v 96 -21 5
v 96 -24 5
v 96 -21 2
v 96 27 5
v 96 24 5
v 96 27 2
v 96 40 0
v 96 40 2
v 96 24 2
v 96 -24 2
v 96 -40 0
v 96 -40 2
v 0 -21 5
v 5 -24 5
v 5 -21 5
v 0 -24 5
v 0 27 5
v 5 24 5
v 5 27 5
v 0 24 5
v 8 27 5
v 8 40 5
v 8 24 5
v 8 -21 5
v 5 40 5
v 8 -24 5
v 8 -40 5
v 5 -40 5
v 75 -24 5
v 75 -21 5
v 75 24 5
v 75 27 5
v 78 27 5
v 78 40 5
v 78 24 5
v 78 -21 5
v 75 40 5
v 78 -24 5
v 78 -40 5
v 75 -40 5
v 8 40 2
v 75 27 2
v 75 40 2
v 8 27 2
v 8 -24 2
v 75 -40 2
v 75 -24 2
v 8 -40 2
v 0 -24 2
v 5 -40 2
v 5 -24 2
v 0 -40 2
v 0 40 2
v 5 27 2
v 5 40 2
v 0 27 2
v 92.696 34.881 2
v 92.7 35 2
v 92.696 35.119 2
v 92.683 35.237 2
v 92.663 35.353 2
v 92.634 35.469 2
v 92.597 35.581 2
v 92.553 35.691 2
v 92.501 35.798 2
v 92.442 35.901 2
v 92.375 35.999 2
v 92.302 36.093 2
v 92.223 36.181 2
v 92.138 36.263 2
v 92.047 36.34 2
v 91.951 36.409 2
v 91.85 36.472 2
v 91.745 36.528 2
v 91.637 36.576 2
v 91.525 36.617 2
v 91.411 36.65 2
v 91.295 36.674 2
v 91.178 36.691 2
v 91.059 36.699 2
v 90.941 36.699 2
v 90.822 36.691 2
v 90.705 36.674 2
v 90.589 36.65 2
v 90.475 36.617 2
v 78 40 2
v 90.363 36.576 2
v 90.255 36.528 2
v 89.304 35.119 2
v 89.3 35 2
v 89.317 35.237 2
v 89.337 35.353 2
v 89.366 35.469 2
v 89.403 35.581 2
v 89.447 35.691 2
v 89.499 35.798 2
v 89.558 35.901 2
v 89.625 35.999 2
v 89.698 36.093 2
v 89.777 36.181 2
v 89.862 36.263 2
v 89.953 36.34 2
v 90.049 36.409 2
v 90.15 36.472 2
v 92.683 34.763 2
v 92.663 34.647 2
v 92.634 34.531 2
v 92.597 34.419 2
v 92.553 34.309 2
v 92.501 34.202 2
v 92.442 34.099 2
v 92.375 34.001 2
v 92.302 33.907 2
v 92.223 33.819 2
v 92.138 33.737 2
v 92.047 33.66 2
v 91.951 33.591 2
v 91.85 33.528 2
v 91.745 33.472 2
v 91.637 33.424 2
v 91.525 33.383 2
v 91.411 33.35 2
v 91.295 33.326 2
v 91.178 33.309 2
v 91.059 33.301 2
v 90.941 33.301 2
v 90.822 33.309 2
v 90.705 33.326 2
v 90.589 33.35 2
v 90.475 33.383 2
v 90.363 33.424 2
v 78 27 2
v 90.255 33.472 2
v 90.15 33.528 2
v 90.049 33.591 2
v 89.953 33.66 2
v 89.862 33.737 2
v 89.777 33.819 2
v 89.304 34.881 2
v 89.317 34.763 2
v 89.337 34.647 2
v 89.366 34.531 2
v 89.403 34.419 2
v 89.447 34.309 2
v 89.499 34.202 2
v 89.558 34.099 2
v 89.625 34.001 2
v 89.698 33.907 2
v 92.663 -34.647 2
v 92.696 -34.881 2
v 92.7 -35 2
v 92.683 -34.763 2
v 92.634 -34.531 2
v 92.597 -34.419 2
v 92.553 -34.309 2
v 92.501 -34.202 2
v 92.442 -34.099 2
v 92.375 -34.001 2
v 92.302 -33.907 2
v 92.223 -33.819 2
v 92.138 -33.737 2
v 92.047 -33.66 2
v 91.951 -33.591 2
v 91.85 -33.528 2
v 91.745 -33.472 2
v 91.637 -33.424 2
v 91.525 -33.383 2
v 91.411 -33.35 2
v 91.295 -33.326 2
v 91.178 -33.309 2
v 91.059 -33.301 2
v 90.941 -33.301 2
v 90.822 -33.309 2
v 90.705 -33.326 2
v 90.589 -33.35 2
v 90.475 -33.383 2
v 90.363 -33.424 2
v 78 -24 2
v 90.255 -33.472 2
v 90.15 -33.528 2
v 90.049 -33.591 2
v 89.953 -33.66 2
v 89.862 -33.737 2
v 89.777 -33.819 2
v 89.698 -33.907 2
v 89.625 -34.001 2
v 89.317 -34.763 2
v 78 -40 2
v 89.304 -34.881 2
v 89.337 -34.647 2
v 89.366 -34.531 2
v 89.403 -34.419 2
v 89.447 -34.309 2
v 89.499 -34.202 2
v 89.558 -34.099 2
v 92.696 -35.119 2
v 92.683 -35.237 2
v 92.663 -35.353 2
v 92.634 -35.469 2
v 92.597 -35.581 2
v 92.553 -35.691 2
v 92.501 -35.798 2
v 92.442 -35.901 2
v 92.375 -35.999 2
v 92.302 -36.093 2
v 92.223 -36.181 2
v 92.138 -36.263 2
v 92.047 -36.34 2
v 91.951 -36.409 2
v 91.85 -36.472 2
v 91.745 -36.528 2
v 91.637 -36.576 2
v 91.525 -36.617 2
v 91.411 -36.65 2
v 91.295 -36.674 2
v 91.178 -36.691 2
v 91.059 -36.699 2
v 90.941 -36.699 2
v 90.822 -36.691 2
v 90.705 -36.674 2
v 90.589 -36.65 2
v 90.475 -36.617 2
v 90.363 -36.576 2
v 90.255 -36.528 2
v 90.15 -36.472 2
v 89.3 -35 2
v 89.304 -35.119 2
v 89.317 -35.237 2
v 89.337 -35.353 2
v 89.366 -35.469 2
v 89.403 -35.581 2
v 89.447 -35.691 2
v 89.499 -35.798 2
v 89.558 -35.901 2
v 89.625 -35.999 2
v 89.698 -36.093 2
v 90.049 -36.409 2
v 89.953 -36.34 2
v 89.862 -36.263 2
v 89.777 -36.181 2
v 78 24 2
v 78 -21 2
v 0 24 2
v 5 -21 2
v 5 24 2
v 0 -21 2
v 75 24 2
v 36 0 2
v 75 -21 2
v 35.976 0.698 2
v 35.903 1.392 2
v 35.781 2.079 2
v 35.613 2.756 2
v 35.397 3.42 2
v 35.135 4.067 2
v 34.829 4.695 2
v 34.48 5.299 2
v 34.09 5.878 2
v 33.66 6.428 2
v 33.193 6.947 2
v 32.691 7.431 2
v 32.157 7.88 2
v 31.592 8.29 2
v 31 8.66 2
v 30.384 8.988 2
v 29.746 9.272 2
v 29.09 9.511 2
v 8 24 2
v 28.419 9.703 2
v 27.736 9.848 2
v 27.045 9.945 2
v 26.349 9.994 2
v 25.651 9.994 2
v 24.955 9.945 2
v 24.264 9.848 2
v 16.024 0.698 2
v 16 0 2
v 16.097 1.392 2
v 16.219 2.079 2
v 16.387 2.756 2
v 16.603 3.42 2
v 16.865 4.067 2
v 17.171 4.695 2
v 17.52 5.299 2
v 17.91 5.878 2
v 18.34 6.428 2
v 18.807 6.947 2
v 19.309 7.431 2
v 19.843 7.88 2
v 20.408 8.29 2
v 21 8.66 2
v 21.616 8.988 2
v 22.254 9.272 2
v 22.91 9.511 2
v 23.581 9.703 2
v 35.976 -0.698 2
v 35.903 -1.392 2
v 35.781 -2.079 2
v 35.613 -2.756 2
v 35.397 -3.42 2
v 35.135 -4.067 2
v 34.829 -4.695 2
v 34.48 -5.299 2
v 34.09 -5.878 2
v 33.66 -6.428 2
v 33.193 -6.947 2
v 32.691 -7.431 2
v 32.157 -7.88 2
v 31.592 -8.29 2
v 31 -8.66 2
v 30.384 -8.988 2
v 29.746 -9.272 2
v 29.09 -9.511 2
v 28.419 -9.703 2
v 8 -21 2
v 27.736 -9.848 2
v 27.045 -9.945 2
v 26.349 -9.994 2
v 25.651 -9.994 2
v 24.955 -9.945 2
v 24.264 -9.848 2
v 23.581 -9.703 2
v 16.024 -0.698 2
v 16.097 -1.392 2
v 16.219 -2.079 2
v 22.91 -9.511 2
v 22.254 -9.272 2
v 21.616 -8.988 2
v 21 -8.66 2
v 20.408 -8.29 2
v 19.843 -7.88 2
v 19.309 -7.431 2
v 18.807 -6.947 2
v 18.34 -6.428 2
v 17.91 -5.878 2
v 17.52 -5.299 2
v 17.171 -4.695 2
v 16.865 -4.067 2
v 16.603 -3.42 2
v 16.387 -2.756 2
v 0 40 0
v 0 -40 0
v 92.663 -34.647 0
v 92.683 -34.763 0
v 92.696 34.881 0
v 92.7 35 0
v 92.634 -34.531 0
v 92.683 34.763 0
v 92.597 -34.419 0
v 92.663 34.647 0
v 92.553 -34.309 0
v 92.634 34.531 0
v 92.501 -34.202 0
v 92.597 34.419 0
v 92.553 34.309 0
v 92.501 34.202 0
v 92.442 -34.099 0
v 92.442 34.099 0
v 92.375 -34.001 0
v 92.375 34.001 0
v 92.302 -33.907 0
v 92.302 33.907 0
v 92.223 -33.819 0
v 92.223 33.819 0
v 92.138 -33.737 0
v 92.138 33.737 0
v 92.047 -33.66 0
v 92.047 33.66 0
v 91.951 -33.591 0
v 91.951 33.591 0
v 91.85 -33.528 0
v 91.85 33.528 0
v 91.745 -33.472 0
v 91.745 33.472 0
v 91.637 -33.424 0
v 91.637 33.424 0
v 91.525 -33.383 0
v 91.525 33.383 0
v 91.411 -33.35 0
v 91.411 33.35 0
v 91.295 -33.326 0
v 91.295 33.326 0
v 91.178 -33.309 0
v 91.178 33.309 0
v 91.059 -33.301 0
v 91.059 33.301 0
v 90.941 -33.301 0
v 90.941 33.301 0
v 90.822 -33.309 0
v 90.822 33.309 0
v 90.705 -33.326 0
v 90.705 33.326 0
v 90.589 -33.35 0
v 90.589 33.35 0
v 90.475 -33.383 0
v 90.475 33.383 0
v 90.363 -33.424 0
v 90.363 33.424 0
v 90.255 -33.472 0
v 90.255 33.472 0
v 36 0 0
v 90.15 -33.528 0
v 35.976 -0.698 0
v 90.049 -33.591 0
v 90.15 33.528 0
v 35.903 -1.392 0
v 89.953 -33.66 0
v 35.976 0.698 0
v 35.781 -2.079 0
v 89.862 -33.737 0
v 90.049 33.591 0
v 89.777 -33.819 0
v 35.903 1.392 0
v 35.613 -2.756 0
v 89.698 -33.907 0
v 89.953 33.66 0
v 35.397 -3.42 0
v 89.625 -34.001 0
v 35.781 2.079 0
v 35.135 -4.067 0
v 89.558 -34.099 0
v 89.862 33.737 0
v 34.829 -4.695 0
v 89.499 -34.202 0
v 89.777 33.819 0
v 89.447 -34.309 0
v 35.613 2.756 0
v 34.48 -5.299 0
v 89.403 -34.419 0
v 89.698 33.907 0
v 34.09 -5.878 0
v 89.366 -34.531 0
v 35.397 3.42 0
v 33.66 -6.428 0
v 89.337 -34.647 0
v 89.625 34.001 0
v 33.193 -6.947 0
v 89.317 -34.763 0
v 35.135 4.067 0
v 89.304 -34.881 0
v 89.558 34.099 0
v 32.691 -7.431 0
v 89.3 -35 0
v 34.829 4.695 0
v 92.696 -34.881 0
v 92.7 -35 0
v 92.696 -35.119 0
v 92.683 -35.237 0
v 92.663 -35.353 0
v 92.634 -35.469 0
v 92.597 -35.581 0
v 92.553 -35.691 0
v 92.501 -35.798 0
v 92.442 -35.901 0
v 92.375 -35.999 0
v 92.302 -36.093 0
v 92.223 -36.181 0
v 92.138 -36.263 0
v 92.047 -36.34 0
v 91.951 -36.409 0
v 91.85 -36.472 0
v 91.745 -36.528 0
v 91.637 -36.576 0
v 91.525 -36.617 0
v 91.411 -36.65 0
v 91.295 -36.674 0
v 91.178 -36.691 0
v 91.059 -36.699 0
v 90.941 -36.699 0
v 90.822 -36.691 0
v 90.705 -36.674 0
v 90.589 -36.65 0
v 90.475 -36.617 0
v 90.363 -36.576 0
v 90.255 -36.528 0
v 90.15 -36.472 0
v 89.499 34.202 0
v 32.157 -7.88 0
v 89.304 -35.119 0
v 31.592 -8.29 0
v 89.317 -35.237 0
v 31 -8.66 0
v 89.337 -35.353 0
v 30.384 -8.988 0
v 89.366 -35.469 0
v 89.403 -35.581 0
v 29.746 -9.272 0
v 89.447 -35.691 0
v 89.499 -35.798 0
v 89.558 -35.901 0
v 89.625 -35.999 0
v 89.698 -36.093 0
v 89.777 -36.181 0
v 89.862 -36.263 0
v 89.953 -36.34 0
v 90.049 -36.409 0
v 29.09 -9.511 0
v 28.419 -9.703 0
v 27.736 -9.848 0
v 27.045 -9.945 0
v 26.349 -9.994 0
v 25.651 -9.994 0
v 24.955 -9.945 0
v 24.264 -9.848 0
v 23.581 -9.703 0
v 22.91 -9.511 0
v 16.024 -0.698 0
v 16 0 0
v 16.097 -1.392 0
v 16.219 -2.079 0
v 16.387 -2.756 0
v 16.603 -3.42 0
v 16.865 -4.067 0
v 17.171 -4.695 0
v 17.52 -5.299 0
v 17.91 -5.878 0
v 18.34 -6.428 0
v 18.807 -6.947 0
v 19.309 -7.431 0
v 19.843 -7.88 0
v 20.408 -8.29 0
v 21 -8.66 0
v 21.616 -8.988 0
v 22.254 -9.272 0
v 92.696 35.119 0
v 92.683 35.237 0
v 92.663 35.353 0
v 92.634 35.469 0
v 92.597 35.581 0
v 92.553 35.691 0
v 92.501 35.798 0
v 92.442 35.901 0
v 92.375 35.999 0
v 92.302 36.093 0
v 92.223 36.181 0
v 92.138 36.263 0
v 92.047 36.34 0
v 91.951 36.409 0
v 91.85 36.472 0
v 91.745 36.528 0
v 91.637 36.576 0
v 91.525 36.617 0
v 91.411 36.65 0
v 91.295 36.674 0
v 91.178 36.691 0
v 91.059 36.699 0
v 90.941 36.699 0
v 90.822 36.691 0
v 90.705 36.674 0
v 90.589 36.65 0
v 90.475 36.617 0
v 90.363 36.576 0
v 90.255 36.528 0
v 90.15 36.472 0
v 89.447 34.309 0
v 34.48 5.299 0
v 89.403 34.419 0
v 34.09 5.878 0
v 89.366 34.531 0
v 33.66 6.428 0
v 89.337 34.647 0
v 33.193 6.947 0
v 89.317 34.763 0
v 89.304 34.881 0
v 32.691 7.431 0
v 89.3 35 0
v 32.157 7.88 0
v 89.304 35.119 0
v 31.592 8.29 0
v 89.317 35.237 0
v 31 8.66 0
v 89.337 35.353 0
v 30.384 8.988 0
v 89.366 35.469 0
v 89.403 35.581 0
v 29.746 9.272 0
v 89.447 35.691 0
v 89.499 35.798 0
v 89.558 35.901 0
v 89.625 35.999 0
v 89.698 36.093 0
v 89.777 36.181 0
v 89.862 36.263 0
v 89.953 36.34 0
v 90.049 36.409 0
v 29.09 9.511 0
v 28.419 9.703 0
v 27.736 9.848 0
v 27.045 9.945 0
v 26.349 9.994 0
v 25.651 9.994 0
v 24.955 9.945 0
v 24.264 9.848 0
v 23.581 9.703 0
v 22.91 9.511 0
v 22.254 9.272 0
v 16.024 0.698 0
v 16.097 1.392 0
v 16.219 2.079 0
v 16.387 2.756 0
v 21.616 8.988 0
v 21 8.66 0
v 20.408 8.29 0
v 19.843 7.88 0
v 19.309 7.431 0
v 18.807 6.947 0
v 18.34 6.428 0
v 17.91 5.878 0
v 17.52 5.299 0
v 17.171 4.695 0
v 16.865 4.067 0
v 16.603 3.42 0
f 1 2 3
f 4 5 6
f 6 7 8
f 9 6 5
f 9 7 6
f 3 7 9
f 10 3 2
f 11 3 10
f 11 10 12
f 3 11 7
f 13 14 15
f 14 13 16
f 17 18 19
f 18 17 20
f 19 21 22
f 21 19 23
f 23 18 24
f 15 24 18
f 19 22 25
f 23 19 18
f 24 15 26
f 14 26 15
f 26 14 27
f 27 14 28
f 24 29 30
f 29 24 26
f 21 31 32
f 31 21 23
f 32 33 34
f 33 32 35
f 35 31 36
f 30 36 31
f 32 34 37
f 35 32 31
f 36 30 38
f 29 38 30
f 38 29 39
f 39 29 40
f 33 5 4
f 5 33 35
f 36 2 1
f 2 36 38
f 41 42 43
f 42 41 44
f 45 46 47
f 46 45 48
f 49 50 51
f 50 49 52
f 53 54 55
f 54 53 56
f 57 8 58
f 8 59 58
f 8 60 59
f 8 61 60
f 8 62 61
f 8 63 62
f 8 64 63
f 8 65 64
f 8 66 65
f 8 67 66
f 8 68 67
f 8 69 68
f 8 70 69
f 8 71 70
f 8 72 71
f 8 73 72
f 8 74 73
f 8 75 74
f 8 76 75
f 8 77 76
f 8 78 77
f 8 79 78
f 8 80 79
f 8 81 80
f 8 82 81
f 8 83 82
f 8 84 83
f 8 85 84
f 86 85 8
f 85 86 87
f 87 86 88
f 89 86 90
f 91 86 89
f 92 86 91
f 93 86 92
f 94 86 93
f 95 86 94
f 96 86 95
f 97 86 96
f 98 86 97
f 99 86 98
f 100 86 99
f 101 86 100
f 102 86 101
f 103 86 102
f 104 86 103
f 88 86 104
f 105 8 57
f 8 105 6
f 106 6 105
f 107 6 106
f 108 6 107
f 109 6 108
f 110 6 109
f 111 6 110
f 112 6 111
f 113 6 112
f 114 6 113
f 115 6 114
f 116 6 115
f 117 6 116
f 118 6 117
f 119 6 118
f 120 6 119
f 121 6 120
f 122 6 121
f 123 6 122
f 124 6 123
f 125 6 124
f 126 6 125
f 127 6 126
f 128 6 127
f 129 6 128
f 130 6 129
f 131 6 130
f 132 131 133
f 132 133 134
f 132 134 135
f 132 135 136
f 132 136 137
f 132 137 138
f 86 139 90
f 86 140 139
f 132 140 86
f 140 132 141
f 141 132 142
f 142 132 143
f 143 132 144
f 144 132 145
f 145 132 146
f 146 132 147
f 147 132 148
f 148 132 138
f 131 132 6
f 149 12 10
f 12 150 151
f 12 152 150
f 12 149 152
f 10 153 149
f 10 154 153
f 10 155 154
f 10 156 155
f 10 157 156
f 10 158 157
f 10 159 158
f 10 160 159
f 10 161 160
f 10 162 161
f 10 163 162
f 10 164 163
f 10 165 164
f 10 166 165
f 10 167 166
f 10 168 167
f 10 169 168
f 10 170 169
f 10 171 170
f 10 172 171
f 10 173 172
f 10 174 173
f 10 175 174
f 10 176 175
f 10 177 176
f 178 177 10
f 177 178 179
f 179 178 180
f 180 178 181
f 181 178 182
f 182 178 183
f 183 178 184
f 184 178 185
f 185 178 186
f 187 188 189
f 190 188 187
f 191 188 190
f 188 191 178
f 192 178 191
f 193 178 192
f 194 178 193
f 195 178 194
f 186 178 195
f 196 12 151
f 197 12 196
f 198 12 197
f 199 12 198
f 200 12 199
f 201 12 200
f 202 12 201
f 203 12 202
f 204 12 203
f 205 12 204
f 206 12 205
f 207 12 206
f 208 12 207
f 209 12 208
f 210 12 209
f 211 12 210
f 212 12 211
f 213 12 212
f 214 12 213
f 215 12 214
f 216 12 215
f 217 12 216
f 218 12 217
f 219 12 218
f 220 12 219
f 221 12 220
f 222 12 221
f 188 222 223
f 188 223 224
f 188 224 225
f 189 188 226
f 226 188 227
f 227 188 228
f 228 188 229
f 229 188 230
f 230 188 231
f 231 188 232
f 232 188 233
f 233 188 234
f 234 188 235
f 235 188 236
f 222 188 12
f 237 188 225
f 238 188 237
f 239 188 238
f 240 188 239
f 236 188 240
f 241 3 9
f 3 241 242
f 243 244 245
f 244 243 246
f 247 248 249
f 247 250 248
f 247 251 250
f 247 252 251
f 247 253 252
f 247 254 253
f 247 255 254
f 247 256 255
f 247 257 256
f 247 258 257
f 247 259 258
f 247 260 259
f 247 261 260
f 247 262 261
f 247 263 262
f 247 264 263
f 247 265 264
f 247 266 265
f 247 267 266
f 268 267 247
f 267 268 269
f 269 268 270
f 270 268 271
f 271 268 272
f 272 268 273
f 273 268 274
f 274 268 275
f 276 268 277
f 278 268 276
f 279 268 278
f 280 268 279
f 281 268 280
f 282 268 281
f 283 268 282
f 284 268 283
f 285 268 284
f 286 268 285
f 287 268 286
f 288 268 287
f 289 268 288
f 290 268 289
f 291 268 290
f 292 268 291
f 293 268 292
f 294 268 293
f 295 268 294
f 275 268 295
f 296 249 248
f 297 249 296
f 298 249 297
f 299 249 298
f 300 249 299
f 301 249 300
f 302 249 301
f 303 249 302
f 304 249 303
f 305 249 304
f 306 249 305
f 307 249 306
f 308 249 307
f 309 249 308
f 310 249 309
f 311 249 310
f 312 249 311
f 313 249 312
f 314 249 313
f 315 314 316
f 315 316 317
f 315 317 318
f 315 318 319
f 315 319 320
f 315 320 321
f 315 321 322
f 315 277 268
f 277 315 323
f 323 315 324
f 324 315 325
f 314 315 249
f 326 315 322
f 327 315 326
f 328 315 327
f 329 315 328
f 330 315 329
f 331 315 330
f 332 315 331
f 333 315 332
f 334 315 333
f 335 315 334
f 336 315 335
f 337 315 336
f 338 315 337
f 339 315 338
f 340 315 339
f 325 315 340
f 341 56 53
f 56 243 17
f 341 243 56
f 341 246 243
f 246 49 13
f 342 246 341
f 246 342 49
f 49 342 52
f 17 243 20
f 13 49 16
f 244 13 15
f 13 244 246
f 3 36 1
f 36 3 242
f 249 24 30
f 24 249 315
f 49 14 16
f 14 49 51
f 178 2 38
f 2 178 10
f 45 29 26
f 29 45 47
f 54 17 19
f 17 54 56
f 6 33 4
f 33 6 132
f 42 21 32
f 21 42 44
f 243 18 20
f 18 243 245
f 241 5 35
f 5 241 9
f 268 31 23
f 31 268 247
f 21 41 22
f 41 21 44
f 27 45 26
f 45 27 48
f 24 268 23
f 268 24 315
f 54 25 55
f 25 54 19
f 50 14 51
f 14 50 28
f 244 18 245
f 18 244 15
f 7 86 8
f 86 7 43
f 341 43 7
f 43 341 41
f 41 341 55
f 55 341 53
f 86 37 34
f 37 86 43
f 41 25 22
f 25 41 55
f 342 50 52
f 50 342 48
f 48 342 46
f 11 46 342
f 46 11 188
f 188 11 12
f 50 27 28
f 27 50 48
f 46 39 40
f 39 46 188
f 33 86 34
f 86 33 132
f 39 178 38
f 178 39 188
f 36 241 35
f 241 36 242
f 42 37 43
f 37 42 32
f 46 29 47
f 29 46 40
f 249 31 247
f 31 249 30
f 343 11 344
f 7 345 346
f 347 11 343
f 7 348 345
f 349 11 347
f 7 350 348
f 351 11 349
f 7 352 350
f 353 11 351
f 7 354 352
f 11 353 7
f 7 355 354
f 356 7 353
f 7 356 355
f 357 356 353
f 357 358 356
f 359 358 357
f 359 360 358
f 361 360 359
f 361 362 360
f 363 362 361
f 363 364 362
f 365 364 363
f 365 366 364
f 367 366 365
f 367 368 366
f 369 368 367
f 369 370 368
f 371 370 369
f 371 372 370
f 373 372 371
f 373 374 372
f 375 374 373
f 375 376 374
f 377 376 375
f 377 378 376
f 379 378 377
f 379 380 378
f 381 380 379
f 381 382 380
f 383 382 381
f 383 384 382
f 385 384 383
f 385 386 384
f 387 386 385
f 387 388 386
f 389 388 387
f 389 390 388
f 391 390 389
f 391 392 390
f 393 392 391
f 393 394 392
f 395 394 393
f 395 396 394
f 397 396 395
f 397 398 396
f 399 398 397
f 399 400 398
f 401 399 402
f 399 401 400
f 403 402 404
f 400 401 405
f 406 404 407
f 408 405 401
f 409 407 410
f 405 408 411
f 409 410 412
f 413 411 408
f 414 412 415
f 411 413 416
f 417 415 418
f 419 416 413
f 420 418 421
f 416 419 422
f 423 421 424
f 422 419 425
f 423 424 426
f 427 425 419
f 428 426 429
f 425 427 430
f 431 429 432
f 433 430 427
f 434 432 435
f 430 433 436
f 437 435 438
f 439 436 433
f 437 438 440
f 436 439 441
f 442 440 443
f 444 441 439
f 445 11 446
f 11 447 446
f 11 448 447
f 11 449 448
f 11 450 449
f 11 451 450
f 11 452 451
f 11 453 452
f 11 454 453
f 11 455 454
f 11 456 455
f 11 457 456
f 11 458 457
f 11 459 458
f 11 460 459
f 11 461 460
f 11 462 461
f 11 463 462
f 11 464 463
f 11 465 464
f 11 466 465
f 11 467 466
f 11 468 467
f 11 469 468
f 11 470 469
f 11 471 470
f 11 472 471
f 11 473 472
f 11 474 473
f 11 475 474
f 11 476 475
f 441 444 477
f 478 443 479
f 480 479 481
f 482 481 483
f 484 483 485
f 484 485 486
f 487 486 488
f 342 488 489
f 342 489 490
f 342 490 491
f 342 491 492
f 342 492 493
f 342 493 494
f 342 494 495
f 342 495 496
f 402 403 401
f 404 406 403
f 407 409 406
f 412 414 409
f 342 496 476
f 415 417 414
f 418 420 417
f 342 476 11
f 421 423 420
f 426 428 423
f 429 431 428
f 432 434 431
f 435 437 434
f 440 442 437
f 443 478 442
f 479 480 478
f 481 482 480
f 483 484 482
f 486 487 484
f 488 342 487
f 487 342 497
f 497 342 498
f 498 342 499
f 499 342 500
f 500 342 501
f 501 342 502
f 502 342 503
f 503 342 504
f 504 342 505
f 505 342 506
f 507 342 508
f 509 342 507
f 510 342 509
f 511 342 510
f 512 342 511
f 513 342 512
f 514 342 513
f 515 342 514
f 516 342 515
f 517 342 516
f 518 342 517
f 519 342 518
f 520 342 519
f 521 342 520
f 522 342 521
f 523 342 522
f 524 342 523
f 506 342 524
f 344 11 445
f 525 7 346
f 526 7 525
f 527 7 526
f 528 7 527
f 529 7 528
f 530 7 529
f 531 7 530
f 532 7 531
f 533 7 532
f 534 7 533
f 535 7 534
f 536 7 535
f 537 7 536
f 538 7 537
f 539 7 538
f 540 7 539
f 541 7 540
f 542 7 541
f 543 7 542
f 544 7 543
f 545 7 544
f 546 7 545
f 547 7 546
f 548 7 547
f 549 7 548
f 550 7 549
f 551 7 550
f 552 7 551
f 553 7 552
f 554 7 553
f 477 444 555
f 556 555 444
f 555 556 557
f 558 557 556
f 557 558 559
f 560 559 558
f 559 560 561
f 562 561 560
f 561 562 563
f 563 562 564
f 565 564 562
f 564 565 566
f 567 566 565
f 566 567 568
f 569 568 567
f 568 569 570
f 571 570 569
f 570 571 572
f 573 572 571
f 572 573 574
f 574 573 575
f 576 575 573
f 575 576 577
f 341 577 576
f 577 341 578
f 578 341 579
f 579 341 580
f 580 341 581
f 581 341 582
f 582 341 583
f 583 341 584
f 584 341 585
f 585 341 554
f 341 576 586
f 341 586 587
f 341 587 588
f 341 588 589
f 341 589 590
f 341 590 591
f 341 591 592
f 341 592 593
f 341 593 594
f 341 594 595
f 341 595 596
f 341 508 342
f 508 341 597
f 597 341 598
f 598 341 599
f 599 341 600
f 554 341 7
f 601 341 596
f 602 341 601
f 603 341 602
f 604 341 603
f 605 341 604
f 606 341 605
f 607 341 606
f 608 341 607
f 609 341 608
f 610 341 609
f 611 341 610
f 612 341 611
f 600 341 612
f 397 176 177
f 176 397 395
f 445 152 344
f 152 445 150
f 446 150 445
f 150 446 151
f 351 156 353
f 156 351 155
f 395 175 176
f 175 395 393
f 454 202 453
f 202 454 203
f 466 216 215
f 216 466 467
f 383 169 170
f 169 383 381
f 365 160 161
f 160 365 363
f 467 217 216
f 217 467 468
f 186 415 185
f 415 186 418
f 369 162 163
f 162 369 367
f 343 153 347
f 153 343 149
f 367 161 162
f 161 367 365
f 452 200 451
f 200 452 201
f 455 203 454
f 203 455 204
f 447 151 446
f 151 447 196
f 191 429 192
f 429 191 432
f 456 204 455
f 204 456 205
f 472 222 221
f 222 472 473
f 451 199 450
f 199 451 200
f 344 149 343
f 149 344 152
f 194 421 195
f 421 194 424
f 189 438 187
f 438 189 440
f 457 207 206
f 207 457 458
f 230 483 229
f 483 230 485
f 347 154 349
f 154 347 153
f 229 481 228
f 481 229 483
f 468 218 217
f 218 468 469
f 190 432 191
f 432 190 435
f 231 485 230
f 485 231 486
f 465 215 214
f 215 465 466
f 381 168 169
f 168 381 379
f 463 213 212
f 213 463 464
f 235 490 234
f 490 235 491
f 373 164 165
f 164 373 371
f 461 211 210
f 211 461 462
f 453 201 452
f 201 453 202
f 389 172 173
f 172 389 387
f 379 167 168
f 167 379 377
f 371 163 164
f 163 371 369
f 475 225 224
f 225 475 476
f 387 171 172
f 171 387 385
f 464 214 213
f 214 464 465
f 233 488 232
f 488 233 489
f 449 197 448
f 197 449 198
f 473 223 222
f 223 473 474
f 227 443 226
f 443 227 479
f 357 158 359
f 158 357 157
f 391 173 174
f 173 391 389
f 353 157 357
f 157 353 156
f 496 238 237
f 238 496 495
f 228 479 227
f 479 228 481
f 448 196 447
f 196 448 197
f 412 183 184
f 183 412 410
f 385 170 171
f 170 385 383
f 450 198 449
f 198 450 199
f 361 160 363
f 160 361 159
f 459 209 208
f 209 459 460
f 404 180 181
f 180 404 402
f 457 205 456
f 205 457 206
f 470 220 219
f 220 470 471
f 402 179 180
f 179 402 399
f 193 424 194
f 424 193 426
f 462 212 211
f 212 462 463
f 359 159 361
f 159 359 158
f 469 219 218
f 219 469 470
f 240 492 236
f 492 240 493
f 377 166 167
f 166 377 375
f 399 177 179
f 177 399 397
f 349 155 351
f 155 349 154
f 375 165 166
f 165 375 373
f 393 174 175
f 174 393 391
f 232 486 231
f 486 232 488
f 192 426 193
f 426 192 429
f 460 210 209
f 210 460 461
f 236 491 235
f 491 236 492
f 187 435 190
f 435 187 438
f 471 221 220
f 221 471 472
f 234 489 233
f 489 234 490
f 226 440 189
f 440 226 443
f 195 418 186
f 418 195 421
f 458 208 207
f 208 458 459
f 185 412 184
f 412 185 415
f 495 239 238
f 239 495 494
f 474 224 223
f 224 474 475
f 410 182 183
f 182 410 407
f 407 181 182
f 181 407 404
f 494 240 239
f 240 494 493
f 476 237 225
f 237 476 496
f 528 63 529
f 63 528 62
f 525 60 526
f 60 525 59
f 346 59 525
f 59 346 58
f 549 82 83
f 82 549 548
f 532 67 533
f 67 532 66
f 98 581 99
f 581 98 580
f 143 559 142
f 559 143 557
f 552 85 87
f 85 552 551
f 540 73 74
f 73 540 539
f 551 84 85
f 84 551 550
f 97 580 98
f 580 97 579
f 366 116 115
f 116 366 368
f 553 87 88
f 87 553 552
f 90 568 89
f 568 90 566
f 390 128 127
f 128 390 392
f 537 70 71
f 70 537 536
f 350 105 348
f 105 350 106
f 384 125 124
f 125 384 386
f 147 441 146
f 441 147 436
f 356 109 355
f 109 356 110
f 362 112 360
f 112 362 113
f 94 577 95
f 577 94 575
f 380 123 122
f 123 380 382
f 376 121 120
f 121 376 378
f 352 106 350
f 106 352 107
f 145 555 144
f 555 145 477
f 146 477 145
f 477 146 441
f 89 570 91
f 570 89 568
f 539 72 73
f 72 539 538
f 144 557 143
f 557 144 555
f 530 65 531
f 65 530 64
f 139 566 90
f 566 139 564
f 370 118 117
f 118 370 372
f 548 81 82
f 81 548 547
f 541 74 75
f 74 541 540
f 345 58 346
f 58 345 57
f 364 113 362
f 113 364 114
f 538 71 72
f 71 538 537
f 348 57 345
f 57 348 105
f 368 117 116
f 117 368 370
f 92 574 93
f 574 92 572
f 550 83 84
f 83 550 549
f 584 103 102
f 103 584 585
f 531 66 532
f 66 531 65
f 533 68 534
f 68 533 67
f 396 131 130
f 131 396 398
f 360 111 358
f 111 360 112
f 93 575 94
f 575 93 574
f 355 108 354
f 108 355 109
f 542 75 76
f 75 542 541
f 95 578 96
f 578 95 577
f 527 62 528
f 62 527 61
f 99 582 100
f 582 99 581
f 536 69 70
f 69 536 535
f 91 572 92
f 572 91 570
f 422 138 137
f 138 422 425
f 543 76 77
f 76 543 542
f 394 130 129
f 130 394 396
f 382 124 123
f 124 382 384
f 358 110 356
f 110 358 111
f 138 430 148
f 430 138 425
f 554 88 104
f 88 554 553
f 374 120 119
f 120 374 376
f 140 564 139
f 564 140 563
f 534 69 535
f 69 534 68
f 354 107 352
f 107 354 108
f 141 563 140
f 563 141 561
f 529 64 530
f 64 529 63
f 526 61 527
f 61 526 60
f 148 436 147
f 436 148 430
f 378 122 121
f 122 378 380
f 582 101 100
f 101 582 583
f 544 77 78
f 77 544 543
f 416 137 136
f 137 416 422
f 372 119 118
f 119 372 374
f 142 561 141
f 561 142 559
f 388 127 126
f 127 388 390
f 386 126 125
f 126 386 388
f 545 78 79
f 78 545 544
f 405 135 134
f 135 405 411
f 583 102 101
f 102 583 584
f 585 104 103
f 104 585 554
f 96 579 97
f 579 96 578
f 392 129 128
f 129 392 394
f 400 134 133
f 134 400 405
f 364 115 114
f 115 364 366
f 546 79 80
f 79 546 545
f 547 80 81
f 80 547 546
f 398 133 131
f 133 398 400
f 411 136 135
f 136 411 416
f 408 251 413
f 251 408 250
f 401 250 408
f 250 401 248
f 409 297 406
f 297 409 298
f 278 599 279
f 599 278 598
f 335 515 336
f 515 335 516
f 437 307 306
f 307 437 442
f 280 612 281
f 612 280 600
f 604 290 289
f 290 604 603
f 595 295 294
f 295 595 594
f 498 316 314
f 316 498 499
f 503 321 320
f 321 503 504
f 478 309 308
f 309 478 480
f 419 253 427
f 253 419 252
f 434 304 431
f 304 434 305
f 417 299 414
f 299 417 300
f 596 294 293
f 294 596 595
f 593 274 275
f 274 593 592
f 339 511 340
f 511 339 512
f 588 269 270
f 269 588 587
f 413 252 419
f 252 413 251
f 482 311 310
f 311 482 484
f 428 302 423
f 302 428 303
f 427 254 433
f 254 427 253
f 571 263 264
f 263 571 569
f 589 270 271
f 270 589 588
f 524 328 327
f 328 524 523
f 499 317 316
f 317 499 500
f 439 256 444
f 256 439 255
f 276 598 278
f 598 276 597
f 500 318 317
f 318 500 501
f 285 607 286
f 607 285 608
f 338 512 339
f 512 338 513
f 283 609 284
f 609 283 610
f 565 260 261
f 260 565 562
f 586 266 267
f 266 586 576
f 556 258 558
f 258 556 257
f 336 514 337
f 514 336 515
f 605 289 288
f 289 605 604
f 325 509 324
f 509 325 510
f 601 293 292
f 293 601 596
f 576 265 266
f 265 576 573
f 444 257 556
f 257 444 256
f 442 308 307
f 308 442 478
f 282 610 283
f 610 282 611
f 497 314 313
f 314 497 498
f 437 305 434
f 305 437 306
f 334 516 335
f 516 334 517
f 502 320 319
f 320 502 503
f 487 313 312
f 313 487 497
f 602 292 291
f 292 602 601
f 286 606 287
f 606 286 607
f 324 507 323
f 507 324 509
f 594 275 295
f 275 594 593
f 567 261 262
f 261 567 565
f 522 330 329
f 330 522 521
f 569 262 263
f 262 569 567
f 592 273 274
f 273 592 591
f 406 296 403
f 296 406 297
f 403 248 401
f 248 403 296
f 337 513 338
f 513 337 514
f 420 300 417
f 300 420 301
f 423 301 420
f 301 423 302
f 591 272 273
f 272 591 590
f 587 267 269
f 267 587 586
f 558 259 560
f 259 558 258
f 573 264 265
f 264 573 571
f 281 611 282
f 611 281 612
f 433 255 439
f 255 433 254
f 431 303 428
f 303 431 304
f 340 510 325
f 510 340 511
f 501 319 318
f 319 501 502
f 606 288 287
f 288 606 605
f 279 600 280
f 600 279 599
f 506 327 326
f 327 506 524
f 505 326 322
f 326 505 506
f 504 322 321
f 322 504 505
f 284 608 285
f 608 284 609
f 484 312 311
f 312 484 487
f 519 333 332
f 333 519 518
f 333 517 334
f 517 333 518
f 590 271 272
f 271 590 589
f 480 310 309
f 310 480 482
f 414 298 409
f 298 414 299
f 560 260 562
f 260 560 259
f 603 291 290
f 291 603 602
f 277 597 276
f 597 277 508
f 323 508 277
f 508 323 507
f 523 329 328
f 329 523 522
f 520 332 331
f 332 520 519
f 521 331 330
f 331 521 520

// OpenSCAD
// file: lid_part.scad
module lid() {
    // 52 mm vom linken Ende des Relais bis zur
    // Bohrung (nicht Kante) auf der rechten Seite
    // des Boards.
    height = 2;
    difference() {
        union() {
            translate([0,-40,0])
                cube([96, 80, height]);
            // Verstrebungen
            for (y = [-24,24]) {
                translate([0,y,height])
                    cube([96,3,1.5*height]);
            }
            for (x = [5,75]) {
                translate([x,-40,height])
                    cube([3,80,1.5*height]);
            }
        }
        // Nur zur Ausrichtung der Loecher der Platine
//        for (y = g_bohrmuster_relay_board_y) {
//            translate([52,y,0])
//                cylinder(d=3.4, h=height, $fn=g_fn);
//        }
        // Loecher zur Befestigung an der Box
        for (y = [-35, 35]) {
            translate([91,y,0])
                cylinder(d=3.4, h=height, $fn=g_fn);
        }
        // Aussparung Sicherung
        translate([26,0,0])
            cylinder(d=20, h=height, $fn=g_fn);
    }
}
// main file
// Deckel fuer die Box

g_fn = 90;

include <lid_part.scad>


lid();
